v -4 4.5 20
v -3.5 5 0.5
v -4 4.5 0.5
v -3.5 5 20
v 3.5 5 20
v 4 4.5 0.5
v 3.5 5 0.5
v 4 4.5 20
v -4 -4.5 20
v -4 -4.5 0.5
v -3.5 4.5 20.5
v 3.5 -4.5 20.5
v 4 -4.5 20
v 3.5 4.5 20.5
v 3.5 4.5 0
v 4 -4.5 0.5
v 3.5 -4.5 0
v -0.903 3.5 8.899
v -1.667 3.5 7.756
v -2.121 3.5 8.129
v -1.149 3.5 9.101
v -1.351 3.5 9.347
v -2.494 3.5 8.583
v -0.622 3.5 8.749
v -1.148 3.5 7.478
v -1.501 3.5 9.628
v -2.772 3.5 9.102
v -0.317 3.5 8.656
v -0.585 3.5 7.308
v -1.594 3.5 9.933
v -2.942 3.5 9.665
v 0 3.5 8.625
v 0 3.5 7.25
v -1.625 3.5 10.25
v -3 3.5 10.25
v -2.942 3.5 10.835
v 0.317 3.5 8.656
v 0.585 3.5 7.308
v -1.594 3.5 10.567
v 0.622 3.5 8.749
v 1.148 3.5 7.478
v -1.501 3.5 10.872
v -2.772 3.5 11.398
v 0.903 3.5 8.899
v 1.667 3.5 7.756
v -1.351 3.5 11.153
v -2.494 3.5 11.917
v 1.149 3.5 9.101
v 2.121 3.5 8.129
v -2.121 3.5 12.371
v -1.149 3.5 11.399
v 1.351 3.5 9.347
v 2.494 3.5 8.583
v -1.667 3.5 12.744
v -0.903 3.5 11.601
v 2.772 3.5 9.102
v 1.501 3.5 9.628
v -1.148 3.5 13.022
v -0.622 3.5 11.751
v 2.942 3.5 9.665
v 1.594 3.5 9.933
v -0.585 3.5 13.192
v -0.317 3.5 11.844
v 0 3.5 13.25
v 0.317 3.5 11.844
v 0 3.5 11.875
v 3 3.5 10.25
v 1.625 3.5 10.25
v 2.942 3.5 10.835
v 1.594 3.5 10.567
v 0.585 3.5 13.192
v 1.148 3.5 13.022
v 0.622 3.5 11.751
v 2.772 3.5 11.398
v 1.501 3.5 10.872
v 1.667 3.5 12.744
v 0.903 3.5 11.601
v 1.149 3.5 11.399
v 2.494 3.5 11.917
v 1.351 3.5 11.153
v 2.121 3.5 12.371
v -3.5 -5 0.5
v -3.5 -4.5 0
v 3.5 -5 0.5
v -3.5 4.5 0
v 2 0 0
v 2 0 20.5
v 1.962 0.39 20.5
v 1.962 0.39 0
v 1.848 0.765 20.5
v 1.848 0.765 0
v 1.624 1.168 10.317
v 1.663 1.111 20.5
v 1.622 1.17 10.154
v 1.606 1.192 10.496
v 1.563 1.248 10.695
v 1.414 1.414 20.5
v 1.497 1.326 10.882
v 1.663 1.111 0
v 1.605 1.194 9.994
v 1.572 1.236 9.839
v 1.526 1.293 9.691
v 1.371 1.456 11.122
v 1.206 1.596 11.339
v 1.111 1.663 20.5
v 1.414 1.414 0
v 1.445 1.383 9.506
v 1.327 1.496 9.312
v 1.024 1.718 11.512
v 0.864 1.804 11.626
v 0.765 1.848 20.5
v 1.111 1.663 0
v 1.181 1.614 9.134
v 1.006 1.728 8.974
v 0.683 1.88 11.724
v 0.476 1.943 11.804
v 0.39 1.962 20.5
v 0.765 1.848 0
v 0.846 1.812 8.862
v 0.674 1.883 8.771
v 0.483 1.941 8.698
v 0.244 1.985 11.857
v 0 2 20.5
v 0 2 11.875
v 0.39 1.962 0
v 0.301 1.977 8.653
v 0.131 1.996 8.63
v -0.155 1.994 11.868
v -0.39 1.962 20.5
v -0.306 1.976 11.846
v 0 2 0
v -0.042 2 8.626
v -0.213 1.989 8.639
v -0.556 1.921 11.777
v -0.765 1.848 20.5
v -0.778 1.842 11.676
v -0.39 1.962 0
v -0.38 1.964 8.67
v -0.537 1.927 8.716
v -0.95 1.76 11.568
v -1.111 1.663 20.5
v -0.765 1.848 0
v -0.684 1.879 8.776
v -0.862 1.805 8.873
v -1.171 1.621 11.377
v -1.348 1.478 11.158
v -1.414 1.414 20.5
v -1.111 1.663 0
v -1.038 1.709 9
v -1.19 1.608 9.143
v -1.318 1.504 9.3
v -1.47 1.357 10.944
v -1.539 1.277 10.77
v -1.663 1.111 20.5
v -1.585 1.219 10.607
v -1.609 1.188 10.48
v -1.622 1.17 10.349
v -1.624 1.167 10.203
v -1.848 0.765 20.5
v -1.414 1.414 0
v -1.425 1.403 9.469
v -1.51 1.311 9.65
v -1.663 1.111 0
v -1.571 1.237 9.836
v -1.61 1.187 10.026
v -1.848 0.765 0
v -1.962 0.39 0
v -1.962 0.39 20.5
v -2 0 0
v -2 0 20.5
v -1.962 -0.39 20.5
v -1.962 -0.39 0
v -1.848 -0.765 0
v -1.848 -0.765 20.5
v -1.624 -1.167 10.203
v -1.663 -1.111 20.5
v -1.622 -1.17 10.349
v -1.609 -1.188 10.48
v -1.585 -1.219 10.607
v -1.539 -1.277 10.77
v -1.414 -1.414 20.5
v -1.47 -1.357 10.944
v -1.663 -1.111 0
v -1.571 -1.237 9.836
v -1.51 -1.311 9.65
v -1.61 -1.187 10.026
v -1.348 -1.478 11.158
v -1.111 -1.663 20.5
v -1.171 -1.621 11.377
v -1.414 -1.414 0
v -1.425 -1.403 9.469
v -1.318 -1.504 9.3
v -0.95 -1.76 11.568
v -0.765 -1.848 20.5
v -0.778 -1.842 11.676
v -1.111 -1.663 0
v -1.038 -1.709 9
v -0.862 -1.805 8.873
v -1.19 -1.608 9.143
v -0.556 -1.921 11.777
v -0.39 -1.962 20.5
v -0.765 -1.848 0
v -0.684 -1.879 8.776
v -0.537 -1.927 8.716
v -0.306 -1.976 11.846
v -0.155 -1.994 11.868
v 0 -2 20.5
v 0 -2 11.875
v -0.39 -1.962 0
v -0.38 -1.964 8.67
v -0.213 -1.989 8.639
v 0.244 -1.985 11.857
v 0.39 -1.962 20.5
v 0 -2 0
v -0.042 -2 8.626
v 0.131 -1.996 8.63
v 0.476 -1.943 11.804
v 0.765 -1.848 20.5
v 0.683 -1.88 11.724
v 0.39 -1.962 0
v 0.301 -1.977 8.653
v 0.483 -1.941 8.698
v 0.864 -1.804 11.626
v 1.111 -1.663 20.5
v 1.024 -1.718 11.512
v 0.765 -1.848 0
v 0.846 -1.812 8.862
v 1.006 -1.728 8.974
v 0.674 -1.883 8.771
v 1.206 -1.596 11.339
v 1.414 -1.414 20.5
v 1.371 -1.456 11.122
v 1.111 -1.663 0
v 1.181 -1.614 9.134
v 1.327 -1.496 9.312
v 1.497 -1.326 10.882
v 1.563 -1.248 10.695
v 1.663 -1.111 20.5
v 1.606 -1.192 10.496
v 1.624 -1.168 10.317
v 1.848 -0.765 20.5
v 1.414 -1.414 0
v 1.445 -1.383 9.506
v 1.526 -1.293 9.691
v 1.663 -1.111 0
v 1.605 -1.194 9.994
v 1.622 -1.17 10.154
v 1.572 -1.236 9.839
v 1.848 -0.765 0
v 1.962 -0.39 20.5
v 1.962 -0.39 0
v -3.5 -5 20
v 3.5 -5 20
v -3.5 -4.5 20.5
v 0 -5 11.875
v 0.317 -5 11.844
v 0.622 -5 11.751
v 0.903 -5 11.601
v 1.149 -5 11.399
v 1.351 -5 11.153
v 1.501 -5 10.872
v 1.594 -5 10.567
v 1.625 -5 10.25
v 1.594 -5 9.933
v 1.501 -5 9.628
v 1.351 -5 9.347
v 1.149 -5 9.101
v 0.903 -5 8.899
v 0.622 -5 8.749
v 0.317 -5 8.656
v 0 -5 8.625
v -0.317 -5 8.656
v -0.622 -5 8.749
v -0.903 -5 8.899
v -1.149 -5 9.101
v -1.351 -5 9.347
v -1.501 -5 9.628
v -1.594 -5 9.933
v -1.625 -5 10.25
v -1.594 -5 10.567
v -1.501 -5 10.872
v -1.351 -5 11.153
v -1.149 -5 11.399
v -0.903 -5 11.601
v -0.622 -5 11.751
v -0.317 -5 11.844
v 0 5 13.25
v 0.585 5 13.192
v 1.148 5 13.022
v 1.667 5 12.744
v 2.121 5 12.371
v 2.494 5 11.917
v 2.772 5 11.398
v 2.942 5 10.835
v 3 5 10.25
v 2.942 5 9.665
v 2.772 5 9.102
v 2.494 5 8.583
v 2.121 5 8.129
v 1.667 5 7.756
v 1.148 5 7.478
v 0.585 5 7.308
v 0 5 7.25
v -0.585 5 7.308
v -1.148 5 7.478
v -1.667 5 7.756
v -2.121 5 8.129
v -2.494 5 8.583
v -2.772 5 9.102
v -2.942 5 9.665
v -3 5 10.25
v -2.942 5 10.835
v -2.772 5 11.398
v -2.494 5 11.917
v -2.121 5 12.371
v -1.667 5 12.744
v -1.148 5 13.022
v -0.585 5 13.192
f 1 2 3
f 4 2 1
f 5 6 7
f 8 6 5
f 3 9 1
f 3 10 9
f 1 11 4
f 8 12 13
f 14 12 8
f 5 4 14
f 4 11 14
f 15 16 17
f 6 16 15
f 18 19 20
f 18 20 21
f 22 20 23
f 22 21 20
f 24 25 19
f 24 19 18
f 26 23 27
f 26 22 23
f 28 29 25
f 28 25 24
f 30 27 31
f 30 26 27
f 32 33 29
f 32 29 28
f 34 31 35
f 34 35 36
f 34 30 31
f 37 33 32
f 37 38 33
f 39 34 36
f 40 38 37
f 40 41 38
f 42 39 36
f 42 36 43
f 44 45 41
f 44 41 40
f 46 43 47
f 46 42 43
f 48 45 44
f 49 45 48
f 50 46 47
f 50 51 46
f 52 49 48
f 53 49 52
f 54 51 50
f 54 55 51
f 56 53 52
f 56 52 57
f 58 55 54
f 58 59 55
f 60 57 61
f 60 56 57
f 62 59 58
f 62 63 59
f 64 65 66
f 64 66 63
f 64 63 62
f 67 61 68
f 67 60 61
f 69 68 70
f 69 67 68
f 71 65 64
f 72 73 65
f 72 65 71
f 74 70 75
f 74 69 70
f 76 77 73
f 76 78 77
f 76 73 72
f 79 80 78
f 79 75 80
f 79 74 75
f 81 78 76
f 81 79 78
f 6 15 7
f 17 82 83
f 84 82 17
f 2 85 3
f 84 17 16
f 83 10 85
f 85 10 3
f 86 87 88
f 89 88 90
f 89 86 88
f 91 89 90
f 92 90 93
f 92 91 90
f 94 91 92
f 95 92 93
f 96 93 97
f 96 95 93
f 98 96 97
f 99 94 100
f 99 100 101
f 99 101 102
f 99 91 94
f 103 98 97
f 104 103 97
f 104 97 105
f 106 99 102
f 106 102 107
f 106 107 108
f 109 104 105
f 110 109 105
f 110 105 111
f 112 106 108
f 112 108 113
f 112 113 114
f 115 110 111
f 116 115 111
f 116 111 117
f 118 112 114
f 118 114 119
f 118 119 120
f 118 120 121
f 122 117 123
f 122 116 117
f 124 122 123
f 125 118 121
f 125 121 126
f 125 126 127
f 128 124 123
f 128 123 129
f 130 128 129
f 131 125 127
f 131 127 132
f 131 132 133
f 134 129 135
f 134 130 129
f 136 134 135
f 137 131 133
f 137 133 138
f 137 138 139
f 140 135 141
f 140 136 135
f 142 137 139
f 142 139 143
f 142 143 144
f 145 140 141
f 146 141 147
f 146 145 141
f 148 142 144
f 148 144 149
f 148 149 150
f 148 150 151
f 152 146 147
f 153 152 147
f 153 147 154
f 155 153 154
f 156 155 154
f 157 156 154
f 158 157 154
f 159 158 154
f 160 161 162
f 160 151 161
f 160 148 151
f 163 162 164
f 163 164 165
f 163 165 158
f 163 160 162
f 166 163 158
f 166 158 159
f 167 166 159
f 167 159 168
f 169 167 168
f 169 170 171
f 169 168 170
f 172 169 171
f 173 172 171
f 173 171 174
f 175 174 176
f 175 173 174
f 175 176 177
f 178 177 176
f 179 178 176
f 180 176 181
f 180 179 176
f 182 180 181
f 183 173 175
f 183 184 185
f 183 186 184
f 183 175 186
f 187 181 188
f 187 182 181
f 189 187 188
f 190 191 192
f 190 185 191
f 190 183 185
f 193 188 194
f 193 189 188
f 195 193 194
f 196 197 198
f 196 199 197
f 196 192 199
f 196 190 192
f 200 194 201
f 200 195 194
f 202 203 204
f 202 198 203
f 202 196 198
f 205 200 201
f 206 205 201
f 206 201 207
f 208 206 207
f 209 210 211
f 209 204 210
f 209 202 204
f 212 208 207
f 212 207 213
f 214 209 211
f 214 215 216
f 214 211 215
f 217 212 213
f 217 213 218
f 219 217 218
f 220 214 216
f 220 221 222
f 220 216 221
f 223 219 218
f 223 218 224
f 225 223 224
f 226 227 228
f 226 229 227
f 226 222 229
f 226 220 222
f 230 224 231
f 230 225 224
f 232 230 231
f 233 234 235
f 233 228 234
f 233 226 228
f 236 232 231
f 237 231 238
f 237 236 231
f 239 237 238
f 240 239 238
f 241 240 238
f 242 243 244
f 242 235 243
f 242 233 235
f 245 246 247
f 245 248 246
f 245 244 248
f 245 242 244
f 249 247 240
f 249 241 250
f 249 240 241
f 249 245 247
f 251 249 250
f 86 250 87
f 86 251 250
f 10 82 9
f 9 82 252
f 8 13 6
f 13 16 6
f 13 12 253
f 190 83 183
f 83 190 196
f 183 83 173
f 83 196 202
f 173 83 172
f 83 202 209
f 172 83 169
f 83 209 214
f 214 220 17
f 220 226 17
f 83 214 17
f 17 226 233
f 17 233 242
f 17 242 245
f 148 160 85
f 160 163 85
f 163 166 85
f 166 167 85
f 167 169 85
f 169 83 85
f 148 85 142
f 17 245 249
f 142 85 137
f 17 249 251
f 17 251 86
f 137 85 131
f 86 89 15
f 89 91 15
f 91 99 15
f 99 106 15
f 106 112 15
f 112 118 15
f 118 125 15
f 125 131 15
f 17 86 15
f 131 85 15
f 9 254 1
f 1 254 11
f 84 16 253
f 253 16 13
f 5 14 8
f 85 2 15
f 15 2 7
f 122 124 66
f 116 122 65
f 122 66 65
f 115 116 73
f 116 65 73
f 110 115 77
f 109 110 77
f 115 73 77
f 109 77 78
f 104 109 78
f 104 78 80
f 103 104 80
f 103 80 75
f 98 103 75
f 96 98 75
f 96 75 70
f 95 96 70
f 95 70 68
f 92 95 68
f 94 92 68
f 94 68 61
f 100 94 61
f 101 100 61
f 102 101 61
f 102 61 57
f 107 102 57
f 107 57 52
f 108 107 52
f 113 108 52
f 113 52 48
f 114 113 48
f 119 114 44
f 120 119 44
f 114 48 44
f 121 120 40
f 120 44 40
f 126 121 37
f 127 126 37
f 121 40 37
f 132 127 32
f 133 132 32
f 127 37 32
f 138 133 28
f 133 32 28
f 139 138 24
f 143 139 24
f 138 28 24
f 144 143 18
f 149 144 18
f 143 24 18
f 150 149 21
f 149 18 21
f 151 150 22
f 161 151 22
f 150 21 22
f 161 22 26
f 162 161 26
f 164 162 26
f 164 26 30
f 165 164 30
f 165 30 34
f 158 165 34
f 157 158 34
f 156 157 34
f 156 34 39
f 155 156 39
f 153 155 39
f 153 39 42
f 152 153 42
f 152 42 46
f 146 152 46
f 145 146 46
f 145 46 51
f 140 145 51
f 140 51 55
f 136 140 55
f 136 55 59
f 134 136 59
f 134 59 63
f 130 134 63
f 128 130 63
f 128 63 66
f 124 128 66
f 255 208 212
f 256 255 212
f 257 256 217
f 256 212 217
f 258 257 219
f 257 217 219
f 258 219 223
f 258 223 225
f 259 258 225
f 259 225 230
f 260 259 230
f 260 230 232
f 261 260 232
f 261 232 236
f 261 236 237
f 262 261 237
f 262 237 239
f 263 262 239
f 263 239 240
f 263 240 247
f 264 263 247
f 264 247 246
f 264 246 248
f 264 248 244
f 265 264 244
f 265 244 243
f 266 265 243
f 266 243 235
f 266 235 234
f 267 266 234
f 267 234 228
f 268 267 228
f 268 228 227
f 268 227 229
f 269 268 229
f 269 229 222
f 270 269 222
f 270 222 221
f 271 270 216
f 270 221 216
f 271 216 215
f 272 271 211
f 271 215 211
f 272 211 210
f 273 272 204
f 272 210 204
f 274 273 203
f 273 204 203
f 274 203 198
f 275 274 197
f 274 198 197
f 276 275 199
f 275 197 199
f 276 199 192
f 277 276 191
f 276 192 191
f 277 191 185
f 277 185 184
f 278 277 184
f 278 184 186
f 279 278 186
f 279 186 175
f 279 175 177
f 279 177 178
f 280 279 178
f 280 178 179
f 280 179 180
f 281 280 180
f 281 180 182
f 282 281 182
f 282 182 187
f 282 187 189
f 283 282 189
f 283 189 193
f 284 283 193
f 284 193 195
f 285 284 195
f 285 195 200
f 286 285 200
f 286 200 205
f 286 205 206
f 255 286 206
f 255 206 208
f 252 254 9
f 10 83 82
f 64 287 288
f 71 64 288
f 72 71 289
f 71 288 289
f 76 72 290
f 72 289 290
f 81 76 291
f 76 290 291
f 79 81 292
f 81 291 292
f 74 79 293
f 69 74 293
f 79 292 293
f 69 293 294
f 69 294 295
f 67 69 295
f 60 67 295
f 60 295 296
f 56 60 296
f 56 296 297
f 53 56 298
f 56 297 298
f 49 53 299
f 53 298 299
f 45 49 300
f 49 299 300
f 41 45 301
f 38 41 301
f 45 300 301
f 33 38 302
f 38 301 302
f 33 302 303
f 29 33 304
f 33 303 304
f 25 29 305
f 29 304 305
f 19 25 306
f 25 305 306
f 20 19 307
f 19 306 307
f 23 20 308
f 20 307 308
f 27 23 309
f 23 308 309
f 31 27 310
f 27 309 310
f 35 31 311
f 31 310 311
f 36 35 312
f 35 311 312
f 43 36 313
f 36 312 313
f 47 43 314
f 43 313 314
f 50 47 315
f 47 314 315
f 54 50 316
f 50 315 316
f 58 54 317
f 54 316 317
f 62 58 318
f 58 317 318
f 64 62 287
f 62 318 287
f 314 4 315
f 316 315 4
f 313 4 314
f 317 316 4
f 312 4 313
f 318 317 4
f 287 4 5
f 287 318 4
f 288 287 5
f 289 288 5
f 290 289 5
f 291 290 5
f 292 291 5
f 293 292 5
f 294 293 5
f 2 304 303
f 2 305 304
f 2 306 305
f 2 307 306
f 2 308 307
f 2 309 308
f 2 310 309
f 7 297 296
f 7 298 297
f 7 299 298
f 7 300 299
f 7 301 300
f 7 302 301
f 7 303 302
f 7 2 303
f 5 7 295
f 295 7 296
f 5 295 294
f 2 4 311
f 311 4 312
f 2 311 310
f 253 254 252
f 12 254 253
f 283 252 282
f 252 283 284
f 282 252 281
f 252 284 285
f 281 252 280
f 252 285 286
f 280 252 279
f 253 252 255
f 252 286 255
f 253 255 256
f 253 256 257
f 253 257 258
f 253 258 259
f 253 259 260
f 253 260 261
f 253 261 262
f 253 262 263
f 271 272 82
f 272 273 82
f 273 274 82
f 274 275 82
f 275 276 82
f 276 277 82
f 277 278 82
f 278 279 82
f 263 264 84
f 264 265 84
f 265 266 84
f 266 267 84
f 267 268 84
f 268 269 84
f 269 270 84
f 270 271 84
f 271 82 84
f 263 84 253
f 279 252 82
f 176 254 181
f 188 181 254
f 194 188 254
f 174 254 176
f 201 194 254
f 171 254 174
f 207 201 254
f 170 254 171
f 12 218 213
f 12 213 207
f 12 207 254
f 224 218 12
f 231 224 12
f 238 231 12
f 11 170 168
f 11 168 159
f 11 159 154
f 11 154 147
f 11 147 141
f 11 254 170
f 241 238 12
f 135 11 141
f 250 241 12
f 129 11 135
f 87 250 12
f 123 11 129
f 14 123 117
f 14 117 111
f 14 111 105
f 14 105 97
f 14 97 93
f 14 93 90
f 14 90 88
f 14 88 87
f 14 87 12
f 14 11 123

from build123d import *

# Parameters (mm, degrees)
SKETCH1_W           = 8
SKETCH1_H           = 10
BOSS_EXTRUDE1_DEPTH = 20.5
SKETCH1_3_R         = 2
CUT_EXTRUDE1_DEPTH  = 23
SKETCH2_R           = 1.625
CUT_EXTRUDE3_DEPTH  = 12
CHAMFER1_SIZE       = 0.5
SKETCH3_R           = 3
CUT_EXTRUDE4_DEPTH  = 1.5


with BuildPart() as part:
    # Sketch1 → Boss-Extrude1 (new body)
    with BuildSketch(Plane.XY):
        Rectangle(SKETCH1_W, SKETCH1_H)
    extrude(amount=BOSS_EXTRUDE1_DEPTH)

    # Sketch1<3> → Cut-Extrude1 (cut)
    with BuildSketch(Plane.XY):
        Circle(SKETCH1_3_R)
    extrude(amount=CUT_EXTRUDE1_DEPTH, mode=Mode.SUBTRACT)

    # Sketch2 → Cut-Extrude3 (cut)
    with BuildSketch(Plane(origin=(0, 5, 0), x_dir=(1, 0, 0), z_dir=(0, 1, 0))):
        with Locations((0, -10.25)):
            Circle(SKETCH2_R)
    extrude(amount=-CUT_EXTRUDE3_DEPTH, mode=Mode.SUBTRACT)

    # Chamfer1
    chamfer1_edges = [part.edges().sort_by_distance(p)[0] for p in [
        (-4, 5, 10.25),
        (-4, 0, 20.5),
        (-4, -5, 10.25),
        (-4, 0, 0),
        (4, -5, 10.25),
        (0, -5, 20.5),
        (4, 0, 20.5),
        (0, -5, 0),
        (4, 0, 0),
        (0, 5, 0),
        (4, 5, 10.25),
        (0, 5, 20.5),
    ]]
    chamfer(chamfer1_edges, length=CHAMFER1_SIZE)

    # Sketch3 → Cut-Extrude4 (cut)
    with BuildSketch(Plane(origin=(0, 5, 0), x_dir=(1, 0, 0), z_dir=(0, 1, 0))):
        with Locations((0, -10.25)):
            Circle(SKETCH3_R)
    extrude(amount=-CUT_EXTRUDE4_DEPTH, mode=Mode.SUBTRACT)


solid = part.part
